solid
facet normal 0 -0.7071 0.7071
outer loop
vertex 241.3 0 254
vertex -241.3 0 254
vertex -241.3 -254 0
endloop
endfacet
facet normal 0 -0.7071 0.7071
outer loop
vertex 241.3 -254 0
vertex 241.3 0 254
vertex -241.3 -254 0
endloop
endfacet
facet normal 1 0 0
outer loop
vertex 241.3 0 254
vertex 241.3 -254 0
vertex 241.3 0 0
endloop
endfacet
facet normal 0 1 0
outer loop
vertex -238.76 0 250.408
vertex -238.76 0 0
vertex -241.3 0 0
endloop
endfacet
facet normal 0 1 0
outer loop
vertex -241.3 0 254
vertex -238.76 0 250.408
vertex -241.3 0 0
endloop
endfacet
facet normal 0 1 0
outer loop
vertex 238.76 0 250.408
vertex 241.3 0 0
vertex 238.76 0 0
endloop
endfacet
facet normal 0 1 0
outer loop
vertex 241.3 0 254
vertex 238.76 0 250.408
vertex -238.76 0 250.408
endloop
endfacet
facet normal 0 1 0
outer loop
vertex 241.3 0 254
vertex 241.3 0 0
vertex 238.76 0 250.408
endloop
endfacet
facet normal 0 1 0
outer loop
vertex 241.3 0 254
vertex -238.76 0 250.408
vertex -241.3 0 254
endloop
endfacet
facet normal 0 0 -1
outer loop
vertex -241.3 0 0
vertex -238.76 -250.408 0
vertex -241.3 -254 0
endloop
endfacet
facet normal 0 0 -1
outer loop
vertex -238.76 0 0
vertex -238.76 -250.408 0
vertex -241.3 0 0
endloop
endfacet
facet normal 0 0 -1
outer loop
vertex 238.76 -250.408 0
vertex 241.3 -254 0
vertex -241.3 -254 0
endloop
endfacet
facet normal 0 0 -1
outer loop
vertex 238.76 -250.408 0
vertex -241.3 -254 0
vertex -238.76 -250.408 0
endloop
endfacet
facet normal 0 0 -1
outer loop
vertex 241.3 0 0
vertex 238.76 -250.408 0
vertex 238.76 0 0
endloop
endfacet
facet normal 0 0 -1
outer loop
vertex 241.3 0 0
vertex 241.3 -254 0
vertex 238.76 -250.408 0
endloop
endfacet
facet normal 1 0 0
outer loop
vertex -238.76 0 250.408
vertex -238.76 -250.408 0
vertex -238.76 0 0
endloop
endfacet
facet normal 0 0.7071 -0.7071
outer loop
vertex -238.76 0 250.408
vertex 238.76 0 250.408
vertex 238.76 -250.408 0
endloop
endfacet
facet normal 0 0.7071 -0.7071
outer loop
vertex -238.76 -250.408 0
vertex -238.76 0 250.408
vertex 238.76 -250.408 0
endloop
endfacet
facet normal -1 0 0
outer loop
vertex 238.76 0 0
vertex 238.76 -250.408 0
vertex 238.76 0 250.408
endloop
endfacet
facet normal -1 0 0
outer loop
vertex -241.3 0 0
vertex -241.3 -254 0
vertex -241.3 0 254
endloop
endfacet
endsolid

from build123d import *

# Parameters (mm, degrees)
F1_DEPTH = 241.3
F2_T     = -2.54


with BuildPart() as f1:
    # F0 (on Right) → F1 (new body, symmetric)
    with BuildSketch(Plane.YZ):
        Polygon((-254, 0), (0, 0), (0, 254), align=None)
    extrude(amount=F1_DEPTH, both=True)

    # F2
    f2_openings = [f1.faces().sort_by_distance(p)[0] for p in [
        (0, 0, 127),
        (0, -127, 0),
    ]]
    offset(amount=F2_T, openings=f2_openings)


solid = f1.part
